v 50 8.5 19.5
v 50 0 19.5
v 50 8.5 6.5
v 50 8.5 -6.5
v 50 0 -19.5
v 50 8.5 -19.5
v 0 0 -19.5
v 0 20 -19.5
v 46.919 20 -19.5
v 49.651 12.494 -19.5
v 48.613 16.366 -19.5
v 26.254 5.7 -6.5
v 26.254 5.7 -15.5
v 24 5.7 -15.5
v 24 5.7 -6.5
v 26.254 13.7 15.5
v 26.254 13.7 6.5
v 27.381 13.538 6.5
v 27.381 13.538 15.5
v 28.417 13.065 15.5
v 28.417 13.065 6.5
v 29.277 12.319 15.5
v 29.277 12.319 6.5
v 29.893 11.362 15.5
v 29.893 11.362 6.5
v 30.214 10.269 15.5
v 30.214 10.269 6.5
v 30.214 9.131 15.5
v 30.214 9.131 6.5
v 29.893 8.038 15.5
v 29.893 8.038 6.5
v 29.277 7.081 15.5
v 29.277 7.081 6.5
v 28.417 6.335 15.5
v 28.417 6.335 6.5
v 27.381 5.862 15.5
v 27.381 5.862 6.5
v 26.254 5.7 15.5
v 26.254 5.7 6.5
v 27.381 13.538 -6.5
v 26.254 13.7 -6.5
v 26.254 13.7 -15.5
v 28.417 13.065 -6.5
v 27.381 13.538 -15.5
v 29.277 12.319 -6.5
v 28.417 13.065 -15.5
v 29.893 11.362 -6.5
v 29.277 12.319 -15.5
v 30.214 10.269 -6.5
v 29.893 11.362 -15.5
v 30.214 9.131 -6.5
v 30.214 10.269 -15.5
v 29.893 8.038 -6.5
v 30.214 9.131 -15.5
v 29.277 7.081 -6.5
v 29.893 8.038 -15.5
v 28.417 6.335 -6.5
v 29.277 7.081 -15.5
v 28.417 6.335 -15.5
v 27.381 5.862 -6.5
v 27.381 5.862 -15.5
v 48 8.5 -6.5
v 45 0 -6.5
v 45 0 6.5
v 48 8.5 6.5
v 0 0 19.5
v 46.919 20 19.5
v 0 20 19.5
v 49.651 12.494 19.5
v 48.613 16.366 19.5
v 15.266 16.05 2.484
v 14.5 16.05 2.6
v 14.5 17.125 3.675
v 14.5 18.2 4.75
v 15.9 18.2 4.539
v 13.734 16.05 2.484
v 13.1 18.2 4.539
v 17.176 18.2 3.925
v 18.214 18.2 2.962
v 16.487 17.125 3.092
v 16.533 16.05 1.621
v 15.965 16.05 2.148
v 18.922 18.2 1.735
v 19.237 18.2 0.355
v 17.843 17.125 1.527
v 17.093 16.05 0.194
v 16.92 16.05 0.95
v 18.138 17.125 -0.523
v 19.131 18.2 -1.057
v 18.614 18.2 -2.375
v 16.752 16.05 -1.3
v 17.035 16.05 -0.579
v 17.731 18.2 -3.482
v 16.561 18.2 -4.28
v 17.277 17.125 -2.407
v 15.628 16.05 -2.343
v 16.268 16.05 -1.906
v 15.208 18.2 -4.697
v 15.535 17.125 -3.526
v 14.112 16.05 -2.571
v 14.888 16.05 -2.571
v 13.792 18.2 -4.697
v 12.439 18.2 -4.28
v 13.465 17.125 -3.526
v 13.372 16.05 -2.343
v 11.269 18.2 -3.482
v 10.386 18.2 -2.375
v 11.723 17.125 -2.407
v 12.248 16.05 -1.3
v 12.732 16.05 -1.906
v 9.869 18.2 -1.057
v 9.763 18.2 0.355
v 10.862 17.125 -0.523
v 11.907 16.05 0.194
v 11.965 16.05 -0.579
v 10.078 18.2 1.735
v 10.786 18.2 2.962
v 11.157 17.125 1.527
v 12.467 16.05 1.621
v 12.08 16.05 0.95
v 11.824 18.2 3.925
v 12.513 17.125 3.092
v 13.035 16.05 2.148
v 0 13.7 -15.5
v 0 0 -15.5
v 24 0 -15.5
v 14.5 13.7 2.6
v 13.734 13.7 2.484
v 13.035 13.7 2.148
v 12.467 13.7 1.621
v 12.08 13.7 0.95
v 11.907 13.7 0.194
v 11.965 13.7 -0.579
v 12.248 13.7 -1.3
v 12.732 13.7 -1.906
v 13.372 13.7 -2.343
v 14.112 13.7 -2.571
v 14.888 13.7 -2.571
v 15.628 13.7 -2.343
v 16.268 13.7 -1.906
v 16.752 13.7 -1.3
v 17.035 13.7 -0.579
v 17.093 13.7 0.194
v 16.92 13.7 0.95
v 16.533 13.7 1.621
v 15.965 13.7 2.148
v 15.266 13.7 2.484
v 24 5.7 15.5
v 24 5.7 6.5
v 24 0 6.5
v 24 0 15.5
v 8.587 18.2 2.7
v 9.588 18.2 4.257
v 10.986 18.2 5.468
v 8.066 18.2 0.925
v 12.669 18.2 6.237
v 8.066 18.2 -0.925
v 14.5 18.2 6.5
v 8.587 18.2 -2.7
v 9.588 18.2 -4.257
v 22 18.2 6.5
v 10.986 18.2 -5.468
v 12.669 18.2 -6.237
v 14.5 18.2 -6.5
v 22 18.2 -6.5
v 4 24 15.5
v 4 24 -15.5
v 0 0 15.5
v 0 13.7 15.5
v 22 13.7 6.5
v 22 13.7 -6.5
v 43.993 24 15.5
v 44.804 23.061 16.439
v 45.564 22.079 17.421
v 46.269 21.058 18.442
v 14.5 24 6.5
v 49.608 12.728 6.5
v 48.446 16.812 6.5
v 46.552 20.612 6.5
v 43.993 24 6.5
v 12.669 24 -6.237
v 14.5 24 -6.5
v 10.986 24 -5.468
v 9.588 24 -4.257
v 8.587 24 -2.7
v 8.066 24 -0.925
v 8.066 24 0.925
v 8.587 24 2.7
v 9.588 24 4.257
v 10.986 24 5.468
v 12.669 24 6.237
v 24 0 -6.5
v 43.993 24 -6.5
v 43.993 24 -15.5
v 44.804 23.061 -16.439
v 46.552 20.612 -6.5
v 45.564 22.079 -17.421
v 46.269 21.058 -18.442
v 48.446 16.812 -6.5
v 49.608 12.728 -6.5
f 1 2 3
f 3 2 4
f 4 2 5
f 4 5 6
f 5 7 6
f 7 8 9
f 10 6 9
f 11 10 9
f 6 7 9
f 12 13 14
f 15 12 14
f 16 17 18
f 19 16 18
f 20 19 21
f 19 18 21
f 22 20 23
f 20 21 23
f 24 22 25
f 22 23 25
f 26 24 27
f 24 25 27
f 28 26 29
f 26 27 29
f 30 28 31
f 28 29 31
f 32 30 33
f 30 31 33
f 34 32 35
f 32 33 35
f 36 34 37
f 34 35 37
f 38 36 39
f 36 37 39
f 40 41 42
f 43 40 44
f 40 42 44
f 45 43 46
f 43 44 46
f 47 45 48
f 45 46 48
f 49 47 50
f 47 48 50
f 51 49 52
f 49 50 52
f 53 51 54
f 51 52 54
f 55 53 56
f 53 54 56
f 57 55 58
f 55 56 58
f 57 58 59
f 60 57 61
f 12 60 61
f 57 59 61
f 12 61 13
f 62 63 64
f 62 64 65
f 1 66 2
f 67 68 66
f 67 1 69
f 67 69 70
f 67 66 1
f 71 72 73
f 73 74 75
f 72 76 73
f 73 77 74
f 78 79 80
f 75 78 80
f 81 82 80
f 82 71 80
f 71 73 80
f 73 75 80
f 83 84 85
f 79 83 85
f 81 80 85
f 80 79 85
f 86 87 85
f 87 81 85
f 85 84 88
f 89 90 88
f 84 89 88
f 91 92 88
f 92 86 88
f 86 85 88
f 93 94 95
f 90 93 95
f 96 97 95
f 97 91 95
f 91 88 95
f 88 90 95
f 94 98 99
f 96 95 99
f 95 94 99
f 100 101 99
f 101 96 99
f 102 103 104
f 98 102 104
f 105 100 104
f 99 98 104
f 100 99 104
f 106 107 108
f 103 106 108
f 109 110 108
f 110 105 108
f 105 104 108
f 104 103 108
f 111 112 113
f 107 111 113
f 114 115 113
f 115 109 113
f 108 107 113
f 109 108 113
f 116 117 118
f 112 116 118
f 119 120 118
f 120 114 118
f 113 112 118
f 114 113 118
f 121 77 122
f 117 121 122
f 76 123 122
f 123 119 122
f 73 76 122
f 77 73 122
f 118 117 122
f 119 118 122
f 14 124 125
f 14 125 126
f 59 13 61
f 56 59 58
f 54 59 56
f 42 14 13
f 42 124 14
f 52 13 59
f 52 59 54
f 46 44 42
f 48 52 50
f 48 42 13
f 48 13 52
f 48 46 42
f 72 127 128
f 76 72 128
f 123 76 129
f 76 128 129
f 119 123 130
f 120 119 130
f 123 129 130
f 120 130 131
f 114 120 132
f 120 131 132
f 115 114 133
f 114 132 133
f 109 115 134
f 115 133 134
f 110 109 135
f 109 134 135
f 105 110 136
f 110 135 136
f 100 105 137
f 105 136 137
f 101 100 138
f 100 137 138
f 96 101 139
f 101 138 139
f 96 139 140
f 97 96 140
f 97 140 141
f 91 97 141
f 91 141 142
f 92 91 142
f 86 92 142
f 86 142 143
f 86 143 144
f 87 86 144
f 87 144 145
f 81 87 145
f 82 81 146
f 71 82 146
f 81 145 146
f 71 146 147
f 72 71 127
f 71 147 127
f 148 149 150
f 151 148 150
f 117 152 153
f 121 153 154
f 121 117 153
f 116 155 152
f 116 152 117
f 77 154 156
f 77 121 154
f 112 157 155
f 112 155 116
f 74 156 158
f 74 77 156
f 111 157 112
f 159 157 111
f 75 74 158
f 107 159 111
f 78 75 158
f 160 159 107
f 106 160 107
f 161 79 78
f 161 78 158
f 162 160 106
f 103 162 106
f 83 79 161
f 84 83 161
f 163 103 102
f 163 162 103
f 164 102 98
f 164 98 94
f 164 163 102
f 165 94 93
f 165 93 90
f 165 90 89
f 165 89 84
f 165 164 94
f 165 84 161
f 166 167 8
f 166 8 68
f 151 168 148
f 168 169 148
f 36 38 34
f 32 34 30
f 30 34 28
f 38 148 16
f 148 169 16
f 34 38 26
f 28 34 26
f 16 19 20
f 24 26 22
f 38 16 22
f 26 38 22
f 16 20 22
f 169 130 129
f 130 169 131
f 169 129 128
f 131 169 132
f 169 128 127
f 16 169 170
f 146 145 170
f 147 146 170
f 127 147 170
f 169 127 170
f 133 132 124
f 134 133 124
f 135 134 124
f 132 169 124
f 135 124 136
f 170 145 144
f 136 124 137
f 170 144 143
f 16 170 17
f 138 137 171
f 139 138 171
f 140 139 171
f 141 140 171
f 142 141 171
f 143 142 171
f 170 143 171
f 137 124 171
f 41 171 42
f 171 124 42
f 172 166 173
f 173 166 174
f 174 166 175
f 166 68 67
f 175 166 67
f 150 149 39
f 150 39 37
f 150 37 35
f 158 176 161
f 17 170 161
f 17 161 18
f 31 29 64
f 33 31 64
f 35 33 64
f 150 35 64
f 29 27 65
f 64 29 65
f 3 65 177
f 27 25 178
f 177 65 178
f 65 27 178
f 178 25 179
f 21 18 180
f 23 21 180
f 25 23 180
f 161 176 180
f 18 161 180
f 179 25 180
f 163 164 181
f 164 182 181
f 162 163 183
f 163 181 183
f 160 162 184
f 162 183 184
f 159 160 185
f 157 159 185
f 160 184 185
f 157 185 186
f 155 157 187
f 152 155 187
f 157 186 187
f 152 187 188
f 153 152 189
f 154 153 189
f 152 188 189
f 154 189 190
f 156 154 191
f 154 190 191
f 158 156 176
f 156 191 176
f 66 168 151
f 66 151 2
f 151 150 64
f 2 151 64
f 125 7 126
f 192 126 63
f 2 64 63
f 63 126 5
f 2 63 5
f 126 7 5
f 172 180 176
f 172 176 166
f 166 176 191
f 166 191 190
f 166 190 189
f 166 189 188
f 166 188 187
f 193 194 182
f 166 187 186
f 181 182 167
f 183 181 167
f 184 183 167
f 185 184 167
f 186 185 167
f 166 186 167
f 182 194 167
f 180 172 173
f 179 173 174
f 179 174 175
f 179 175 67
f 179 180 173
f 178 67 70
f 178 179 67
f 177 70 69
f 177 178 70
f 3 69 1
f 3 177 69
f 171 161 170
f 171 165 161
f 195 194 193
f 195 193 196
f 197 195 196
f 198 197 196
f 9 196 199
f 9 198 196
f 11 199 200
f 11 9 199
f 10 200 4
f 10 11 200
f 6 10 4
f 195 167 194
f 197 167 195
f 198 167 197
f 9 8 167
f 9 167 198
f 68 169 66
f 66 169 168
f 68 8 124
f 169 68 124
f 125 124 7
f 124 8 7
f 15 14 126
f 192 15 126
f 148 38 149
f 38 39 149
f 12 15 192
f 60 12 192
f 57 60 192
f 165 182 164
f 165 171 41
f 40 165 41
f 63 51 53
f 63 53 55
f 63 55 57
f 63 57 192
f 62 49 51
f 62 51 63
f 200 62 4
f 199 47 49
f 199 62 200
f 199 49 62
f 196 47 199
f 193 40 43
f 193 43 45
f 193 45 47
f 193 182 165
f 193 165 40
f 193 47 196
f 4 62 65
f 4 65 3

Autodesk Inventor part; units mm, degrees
ref_plane "YZ Plane" through (0, 0, 0) normal (1, 0, 0) x (0, 1, 0)
ref_plane "XZ Plane" through (0, 0, 0) normal (0, 1, 0) x (-1, 0, 0)
ref_plane "XY Plane" through (0, 0, 0) normal (0, 0, 1) x (1, 0, 0)
sketch "Sketch1" plane through (0, 0, 0) normal (0, 0, 1) x (1, 0, 0)
  line L0 (0, 0) -> (50, 0)
  line L1 (50, 0) -> (50, 8.5)
  arc A0 (50, 8.5) -> (43.9926, 24) centre (27, 8.5) ccw
  line L2 (43.9926, 24) -> (0, 24)
  line L3 (0, 24) -> (0, 0)
  dimension "d0" = 50
  dimension "d1" = 24
  dimension "d2" = 8.5
  dimension "d3" = 23
extrude "Extrusion1" add sketch "Sketch1" along normal mid plane 39
sketch "Sketch2" plane through (0, 0, 0) normal (0, 0, 1) x (1, 0, 0)
  line L0 (0, 0) -> (0, 24) projected
  line L1 (0, 13.7) -> (26.2545, 13.7)
  arc A0 (26.2545, 5.7) -> (26.2545, 13.7) centre (26.2545, 9.7) ccw
  line L2 (26.2545, 5.7) -> (24, 5.7)
  line L3 (24, 5.7) -> (24, 0)
  line L4 (50, 0) -> (0, 0) projected
  line L5 (24, 0) -> (0, 0)
  line L6 (0, 0) -> (0, 13.7)
  line L7 (50, 8.5) -> (50, 0) projected
  dimension "d6" = 4
  dimension "d7" = 5.7
  dimension "d8" = 26
extrude "Extrusion2" cut sketch "Sketch2" along normal mid plane 31
sketch "Sketch3" plane through (0, 0, 0) normal (0, 0, 1) x (1, 0, 0)
  line L0 (14.5, 24.0258) -> (14.5, 18.2)
  line L1 (14.5, 18.2) -> (22, 18.2)
  line L2 (22, 18.2) -> (22, 0)
  line L3 (0, 13.7) -> (26.2545, 13.7) projected
  line L4 (22, 0) -> (45, 0)
  line L5 (50, 0) -> (0, 0) projected
  line L6 (50, 8.5) -> (50, 0) projected
  line L7 (50, 8.5) -> (50, 24.0258)
  line L8 (50, 24.0258) -> (14.5, 24.0258)
  line L9 (0, 24) -> (43.9926, 24) projected
  line L10 (45, 0) -> (48, 8.5)
  line L11 (48, 8.5) -> (50, 8.5)
  dimension "d11" = 2
  dimension "d12" = 5
  dimension "d13" = 8.5
  dimension "d14" = 4.5
  dimension "d15" = 35.5
  dimension "d16" = 28
extrude "Extrusion3" cut sketch "Sketch3" along normal mid plane 13 contours L8 L7 L11 L10 L4 L2 L1 L0
sketch "Sketch4" plane through (0, 24, -19.5) normal (0, 1, 0) x (1, 0, 0)
  line L0 (14.5, -26) -> (14.5, -13) projected
  line L1 (14.5, -13) -> (14.5, -26) projected
  arc A0 (14.5, -13) -> (14.5, -26) centre (14.5, -19.5) ccw
  point P0 (0, -19.5)
extrude "Extrusion4" cut sketch "Sketch4" against normal up to surface (5.8 mm away)
sketch "Sketch5" plane through (22, 18.2, 6.5) normal (0, 1, 0) x (1, 0, 0)
  arc A0 (-7.5, 13) -> (-7.5, 0) centre (-7.5, 6.5) ccw projected
  point P0 (-22, 6.5)
hole "Hole1" at (14.5, 18.2, 0) direction (0, -1, 0) diameter 5.2 end through all countersink diameter 9.5 countersink angle 90
chamfer "Chamfer1" distance 4 angle 45 3 edges at (21.9963, 24, 19.5) (0, 24, 0) (21.9963, 24, -19.5)
properties part number "Part015. Fixing Block" material "Steel, Carbon"
